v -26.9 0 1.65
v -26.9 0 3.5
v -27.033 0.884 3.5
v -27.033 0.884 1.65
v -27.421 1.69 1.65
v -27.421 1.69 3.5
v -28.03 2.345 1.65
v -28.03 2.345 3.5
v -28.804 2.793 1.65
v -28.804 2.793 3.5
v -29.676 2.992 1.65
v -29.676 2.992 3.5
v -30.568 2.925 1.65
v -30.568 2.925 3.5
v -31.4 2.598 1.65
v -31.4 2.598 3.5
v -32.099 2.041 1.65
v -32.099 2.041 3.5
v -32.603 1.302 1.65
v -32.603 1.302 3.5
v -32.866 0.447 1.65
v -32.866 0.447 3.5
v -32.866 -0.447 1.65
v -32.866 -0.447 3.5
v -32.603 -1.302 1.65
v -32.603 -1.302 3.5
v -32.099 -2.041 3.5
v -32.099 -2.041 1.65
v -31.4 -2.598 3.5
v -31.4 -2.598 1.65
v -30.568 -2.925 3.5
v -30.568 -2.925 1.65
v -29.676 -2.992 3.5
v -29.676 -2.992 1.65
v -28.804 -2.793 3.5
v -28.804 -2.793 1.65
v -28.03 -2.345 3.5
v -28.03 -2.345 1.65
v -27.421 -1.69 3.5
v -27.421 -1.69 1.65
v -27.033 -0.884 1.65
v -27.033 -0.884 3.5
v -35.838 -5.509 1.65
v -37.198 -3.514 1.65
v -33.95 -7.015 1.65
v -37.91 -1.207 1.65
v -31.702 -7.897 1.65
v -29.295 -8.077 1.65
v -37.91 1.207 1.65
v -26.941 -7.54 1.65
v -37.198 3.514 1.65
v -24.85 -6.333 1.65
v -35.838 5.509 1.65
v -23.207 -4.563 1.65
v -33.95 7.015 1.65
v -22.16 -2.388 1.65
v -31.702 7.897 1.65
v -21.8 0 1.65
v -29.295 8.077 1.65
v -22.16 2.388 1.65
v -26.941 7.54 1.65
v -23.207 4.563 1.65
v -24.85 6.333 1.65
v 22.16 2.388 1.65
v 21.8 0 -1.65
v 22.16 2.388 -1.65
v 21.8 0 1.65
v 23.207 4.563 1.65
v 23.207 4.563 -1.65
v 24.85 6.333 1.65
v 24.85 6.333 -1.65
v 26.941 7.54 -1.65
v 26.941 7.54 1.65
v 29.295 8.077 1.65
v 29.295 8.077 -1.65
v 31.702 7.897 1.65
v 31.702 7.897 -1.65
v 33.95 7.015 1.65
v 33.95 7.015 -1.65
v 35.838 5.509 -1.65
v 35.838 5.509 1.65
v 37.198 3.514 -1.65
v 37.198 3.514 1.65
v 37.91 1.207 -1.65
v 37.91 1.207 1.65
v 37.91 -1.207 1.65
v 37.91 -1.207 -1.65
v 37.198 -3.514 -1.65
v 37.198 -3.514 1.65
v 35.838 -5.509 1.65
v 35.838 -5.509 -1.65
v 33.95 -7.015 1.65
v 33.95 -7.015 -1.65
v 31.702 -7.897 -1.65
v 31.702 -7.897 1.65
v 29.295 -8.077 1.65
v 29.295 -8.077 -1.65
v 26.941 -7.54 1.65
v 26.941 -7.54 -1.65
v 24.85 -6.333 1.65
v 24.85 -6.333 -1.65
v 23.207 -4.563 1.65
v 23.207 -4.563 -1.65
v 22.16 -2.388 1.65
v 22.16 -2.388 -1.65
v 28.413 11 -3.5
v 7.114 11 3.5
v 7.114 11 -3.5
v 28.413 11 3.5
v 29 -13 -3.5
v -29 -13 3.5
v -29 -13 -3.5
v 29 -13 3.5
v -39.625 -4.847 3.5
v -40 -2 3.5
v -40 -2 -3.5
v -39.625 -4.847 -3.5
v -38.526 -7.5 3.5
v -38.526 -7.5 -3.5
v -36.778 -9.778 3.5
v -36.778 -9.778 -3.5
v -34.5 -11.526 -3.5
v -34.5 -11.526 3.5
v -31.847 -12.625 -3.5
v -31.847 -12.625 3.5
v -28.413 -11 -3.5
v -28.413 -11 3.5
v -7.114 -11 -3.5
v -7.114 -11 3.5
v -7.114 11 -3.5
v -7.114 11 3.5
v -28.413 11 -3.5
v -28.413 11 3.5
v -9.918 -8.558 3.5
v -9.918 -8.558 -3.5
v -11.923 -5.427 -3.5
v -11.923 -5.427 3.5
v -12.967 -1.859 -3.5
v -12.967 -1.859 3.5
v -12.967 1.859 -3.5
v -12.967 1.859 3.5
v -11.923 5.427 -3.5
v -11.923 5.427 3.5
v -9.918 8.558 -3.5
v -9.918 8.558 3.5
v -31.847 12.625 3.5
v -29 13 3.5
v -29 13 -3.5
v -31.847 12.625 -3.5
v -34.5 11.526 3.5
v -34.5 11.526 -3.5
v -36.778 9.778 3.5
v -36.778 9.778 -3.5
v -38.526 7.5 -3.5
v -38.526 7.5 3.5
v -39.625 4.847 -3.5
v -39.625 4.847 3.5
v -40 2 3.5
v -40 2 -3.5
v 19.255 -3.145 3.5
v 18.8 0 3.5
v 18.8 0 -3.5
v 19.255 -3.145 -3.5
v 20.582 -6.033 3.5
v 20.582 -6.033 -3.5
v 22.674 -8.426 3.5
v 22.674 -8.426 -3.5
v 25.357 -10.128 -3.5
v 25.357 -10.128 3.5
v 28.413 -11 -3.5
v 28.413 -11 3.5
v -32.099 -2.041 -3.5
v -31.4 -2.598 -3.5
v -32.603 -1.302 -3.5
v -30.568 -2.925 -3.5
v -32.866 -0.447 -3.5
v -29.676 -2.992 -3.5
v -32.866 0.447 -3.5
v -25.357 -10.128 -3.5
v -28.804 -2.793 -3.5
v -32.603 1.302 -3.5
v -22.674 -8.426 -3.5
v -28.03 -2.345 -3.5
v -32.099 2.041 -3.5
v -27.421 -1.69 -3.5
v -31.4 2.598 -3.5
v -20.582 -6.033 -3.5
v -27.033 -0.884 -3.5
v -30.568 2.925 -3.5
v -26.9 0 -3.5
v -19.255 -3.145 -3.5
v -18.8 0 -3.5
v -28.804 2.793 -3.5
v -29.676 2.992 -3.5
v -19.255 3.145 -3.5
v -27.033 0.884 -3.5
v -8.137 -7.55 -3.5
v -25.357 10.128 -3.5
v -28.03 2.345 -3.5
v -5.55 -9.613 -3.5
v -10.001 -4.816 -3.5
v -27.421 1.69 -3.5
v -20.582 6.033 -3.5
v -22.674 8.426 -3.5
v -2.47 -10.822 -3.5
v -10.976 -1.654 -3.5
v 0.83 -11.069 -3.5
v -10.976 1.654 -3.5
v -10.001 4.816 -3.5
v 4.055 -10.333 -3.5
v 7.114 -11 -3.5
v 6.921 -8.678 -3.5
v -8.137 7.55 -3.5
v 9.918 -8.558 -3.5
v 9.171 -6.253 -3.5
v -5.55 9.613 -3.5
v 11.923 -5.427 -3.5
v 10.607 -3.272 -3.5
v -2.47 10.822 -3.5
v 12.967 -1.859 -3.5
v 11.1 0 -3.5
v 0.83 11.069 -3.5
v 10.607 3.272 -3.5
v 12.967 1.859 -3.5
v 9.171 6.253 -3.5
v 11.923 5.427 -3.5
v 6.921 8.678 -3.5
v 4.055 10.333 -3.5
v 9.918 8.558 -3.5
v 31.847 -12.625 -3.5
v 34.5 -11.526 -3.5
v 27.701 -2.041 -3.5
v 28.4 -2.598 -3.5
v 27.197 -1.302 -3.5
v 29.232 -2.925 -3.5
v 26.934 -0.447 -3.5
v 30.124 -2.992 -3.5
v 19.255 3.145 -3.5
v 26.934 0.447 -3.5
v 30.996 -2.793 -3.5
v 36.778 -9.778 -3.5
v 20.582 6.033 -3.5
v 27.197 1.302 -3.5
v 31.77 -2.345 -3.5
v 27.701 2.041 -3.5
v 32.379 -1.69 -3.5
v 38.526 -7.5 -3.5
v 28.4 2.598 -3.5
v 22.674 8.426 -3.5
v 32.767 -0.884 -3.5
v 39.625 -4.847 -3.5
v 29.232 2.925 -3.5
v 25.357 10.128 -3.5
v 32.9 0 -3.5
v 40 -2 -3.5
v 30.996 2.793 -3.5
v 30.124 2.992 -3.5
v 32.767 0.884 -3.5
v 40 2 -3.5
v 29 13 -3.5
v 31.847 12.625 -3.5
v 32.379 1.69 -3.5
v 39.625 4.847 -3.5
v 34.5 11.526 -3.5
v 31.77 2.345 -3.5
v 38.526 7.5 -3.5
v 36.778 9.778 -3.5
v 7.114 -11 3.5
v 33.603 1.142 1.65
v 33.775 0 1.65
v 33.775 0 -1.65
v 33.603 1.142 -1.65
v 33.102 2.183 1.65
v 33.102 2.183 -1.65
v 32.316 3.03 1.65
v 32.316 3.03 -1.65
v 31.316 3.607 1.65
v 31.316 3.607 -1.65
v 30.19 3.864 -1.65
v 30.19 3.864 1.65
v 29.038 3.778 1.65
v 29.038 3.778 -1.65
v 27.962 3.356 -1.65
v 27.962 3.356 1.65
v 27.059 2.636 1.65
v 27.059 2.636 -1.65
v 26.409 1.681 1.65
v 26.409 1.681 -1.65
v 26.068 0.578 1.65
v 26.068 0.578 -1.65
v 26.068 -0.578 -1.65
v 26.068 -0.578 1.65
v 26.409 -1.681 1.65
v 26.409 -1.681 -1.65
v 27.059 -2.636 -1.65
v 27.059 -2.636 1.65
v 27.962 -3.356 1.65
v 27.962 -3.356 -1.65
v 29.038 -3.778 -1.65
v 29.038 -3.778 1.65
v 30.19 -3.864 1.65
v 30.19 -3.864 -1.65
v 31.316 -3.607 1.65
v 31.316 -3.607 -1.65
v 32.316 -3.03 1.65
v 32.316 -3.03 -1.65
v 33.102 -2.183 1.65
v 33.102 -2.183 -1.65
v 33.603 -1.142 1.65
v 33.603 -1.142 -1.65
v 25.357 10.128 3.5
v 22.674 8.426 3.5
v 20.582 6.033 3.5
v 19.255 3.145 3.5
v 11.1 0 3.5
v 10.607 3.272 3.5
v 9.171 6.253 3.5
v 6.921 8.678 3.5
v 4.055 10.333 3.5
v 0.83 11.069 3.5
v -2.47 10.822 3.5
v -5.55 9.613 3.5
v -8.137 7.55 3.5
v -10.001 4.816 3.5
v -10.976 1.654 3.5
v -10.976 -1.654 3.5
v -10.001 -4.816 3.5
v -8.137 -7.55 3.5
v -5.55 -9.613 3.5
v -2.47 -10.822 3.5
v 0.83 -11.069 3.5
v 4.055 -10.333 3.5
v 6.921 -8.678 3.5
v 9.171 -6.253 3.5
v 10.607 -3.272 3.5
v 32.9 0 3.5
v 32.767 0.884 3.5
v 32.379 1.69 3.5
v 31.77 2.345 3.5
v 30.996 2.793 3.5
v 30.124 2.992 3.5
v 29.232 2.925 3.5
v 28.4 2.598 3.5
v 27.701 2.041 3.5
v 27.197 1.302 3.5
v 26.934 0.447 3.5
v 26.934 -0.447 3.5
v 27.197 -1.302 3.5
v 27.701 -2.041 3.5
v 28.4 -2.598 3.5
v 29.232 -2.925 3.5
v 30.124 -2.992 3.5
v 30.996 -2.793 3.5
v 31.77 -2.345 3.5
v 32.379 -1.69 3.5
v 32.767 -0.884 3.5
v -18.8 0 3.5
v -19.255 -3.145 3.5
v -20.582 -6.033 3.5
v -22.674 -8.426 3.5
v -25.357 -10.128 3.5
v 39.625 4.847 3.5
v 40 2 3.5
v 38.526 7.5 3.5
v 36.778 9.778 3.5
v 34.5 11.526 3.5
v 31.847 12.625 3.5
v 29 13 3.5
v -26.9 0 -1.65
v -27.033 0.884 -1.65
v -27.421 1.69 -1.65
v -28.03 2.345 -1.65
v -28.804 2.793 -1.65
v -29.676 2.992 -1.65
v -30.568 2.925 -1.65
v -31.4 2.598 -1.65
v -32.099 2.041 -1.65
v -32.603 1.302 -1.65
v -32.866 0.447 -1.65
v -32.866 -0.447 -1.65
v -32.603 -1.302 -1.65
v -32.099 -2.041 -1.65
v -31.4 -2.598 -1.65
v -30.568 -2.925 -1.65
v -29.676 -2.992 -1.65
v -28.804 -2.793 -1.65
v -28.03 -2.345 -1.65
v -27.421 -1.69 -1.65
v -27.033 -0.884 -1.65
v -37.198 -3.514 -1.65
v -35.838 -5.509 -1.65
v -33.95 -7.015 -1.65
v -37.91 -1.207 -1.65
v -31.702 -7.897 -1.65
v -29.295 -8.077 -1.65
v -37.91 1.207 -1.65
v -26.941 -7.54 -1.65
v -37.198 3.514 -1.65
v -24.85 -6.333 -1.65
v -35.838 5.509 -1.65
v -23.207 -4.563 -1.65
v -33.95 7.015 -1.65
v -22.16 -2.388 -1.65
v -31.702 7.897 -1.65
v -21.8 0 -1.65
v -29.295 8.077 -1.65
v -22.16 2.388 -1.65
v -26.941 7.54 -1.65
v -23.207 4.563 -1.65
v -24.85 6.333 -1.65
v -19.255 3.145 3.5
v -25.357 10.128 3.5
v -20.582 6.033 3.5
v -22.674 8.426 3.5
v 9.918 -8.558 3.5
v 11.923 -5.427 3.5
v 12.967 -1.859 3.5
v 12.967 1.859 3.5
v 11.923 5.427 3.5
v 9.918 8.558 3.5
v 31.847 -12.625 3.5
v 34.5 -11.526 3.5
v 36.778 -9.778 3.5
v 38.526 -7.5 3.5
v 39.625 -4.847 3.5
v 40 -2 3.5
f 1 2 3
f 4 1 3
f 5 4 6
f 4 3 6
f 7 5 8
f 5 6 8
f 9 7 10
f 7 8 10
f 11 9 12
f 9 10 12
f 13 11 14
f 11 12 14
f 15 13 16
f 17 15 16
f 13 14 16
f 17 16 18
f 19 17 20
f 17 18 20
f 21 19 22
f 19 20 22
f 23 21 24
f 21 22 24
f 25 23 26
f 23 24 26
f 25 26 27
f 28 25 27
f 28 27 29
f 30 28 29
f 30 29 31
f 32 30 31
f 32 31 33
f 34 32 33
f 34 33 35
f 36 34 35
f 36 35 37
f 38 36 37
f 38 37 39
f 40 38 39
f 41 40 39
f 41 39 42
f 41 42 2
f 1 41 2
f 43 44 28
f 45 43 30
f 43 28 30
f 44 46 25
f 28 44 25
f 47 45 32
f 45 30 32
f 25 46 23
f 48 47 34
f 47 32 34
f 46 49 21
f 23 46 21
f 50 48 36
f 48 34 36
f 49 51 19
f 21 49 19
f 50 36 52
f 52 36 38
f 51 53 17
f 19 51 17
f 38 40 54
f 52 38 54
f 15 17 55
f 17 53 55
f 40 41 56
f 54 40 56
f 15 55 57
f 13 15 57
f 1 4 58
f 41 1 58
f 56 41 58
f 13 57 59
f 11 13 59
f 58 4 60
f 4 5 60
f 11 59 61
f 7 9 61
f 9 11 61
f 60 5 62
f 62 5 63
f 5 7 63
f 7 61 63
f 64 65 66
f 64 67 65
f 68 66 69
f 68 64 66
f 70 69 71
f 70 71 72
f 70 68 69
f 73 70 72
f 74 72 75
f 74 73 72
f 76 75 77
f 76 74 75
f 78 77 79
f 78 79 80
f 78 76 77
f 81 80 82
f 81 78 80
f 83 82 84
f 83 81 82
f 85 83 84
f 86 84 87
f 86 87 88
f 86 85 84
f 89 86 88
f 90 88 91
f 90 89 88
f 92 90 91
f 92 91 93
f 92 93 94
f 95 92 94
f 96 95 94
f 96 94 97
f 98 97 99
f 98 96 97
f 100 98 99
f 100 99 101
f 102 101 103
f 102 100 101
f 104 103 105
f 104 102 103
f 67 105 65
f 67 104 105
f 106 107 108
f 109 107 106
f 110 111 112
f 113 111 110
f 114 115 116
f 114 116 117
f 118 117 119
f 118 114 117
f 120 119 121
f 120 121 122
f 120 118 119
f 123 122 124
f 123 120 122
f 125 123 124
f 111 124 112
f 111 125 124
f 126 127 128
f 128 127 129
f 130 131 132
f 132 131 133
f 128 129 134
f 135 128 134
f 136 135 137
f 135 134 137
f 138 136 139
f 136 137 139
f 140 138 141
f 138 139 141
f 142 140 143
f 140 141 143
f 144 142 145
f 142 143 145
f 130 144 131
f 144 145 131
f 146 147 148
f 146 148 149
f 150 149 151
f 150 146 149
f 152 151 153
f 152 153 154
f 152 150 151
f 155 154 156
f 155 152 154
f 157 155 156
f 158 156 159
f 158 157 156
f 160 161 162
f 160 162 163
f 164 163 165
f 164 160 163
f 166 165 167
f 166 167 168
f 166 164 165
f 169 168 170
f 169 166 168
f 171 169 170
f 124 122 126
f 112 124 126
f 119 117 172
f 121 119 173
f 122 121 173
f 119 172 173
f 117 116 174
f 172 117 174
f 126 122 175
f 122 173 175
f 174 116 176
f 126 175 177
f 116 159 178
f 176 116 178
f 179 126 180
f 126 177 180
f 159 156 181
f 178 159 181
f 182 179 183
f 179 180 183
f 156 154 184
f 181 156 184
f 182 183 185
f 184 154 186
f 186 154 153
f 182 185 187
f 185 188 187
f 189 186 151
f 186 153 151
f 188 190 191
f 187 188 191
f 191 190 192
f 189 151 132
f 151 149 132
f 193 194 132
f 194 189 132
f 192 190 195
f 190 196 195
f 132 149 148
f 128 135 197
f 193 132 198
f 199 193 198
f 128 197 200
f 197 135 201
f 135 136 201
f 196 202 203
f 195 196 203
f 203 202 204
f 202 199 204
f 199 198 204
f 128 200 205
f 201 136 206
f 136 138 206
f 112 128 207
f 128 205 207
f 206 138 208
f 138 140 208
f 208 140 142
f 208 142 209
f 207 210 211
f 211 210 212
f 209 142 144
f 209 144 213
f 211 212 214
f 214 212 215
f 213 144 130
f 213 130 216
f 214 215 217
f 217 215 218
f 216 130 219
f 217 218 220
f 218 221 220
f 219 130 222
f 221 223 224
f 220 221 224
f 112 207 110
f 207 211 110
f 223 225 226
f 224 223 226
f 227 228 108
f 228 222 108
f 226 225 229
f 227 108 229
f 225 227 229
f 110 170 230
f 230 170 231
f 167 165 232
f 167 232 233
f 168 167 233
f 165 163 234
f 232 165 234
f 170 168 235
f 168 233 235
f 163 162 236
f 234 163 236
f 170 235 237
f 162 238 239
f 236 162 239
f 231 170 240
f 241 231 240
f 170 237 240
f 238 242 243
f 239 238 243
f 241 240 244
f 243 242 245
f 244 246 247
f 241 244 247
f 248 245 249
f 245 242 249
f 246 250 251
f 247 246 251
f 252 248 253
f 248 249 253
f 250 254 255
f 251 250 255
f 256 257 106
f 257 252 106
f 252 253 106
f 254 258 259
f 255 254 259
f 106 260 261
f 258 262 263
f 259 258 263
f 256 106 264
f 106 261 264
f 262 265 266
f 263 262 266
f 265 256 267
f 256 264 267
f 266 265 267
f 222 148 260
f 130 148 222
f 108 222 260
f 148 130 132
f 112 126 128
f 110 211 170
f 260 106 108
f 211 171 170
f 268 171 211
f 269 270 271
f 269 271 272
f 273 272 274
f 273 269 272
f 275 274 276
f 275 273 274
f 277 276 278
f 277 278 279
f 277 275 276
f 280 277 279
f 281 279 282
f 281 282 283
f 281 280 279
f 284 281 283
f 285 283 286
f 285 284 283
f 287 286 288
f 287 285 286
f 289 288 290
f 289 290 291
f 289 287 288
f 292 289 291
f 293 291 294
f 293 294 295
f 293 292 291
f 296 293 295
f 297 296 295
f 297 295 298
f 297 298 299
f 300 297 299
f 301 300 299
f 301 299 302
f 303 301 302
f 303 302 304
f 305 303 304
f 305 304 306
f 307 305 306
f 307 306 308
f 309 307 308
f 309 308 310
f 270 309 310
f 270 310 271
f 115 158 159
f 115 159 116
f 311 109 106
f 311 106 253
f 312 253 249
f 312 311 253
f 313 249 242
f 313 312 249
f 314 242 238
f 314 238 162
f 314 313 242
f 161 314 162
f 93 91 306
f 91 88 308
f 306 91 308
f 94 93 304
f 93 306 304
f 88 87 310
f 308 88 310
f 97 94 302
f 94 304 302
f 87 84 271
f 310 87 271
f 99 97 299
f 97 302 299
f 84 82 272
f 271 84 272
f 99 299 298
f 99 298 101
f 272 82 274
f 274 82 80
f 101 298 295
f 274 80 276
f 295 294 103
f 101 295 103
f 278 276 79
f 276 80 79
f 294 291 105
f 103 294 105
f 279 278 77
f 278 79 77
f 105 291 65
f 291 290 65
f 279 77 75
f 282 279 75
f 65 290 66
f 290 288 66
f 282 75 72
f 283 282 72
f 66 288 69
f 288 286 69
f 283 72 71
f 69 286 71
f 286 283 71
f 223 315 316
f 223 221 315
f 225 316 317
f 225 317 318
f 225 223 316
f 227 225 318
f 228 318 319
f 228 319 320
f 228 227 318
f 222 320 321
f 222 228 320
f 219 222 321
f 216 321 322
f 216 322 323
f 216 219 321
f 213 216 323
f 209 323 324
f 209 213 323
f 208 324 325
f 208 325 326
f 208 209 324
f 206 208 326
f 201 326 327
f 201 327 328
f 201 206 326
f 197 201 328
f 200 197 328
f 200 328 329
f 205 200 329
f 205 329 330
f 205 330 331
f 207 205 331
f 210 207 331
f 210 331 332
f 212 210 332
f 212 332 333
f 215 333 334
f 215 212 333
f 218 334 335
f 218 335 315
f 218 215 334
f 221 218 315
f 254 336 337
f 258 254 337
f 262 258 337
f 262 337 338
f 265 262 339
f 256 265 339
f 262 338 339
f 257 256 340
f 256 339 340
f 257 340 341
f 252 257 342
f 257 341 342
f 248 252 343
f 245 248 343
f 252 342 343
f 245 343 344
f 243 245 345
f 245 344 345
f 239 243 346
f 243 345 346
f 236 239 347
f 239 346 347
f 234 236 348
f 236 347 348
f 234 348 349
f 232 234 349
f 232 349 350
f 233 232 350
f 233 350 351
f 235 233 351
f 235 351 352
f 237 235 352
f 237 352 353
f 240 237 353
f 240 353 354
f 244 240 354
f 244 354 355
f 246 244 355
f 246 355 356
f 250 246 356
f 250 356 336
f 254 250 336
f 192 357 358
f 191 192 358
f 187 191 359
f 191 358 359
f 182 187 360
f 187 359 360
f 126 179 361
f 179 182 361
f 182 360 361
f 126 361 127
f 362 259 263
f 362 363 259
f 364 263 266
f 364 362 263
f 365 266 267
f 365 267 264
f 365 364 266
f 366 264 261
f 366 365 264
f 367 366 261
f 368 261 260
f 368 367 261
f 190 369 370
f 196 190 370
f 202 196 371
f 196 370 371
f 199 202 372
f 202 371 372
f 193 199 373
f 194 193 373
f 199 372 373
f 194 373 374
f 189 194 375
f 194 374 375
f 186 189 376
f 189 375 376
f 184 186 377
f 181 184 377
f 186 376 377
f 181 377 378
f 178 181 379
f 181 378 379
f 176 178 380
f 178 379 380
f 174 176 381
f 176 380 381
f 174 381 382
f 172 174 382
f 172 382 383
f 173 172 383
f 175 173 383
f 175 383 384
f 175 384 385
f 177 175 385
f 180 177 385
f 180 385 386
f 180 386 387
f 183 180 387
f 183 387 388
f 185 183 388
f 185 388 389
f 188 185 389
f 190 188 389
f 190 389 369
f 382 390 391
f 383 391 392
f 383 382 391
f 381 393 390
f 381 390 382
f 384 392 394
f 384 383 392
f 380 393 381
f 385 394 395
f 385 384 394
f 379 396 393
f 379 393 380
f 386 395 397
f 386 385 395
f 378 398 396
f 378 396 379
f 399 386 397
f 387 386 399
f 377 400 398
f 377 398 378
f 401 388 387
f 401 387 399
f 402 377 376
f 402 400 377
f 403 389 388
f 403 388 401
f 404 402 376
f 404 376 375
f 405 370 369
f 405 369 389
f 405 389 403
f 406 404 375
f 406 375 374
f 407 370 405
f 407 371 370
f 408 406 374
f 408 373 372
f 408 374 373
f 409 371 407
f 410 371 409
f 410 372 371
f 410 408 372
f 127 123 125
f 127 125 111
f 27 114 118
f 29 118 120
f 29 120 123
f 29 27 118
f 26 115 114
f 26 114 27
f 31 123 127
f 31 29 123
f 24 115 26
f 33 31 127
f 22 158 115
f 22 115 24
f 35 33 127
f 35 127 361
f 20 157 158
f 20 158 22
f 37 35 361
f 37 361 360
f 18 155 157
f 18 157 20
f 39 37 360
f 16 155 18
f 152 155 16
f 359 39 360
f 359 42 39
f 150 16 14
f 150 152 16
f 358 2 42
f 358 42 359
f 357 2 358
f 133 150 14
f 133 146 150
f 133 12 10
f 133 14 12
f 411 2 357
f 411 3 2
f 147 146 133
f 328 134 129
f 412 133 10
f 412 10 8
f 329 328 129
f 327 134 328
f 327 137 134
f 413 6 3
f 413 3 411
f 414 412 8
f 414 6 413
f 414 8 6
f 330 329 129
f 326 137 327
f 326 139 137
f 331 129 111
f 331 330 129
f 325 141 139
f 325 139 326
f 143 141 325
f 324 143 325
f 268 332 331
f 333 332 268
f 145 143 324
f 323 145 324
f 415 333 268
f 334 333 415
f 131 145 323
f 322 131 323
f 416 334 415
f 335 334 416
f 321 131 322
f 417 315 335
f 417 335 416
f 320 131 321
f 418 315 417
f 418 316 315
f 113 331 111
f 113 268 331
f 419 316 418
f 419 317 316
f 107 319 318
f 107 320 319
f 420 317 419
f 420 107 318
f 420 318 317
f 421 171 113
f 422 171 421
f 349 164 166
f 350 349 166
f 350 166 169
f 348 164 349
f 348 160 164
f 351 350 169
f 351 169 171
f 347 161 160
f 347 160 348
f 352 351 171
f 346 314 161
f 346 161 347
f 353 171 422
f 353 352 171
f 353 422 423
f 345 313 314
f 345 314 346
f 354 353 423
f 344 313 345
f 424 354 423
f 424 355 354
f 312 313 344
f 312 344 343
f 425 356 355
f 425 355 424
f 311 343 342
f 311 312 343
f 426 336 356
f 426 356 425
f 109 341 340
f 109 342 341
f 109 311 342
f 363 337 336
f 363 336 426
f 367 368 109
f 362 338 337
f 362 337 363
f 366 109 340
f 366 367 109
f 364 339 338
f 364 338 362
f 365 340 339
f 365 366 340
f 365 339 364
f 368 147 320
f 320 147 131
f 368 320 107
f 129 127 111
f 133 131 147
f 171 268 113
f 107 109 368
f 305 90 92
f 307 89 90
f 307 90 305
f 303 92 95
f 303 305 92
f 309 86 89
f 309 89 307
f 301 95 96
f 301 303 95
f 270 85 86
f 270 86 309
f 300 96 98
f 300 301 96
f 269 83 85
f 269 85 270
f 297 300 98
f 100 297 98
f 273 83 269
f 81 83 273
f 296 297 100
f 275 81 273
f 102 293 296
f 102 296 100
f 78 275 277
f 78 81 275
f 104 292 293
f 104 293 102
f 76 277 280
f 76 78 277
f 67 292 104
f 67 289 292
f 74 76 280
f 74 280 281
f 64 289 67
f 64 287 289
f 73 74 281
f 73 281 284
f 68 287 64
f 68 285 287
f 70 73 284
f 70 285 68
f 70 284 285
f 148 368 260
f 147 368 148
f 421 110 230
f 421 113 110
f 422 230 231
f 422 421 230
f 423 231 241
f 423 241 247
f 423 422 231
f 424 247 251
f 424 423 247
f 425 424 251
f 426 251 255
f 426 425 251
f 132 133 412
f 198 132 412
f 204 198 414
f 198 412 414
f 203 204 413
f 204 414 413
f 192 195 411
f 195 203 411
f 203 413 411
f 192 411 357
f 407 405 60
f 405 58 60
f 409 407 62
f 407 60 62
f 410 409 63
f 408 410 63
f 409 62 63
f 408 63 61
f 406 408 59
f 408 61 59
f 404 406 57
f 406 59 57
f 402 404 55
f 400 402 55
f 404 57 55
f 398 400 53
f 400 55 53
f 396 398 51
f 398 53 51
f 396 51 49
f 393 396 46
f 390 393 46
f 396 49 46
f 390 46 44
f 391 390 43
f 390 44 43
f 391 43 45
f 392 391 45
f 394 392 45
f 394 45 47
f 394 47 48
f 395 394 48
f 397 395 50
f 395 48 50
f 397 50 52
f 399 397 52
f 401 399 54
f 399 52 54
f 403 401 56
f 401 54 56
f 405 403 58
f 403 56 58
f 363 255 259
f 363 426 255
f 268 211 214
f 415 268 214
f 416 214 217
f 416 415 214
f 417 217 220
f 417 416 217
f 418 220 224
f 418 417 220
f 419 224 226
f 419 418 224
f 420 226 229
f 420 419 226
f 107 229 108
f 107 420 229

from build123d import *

# Parameters (mm, degrees)
F0_R      = 11.1
F1_DEPTH  = 3.5
F2_R      = 8.1
F4_DEPTH  = 1.65
F6_DEPTH  = 7.001
F7_R      = 3
F8_DEPTH  = 7.001
F9_R      = 3.875
F9_R_2    = 3
F10_DEPTH = 7


# Not quite as in the source:
# - a pattern or mirror of a feature is missing from the dataset's text; its kind, count and spacing are read off the source's solid


with BuildPart() as f1:
    # F0 (on Top) → F1 (new body, symmetric)
    with BuildSketch(Plane.XY):
        with BuildLine():
            ThreePointArc((40, 2), (36.7781745931, 9.7781745931), (29, 13))
            Line((29, 13), (-29, 13))
            ThreePointArc((-29, 13), (-36.7781745931, 9.7781745931), (-40, 2))
            Line((-40, 2), (-40, -2))
            ThreePointArc((-40, -2), (-36.7781745931, -9.7781745931), (-29, -13))
            Line((-29, -13), (29, -13))
            ThreePointArc((29, -13), (36.7781745931, -9.7781745931), (40, -2))
            Line((40, -2), (40, 2))
        make_face()
        Circle(F0_R, mode=Mode.SUBTRACT)
    extrude(amount=F1_DEPTH, both=True)

    # F2 (on Top) → F4 (cut, symmetric)
    with BuildSketch(Plane.XY):
        with Locations((-29.9, 0)):
            Circle(F2_R)
    f4 = extrude(amount=F4_DEPTH, both=True, mode=Mode.SUBTRACT)

    # F4_copies: F4 across plane
    add(f4.mirror(Plane(origin=(0, 0, 0), x_dir=(0, 0, 1), z_dir=(1, 0, 0))), mode=Mode.SUBTRACT)

    # F5 (on face) → F6 (cut, through all)
    with BuildSketch(Plane.XY.offset(3.5)):
        with BuildLine():
            ThreePointArc((-7.1140705647, -11), (-13.1, 0), (-7.1140705647, 11))
            Line((-7.1140705647, 11), (-28.4133931253, 11))
            ThreePointArc((-28.4133931253, 11), (-21.542029663, 7.3044049618), (-18.8, 0))
            ThreePointArc((-18.8, 0), (-21.542029663, -7.3044049618), (-28.4133931253, -11))
            Line((-28.4133931253, -11), (-7.1140705647, -11))
        make_face()
    f6 = extrude(amount=-F6_DEPTH, mode=Mode.SUBTRACT)

    # F6_copies: F6 across plane
    add(f6.mirror(Plane(origin=(0, 0, 0), x_dir=(0, 0, 1), z_dir=(1, 0, 0))), mode=Mode.SUBTRACT)

    # F7 (on face) → F8 (cut, through all)
    with BuildSketch(Plane.XY.offset(3.5)):
        with Locations((29.9, 0)):
            Circle(F7_R)
        with Locations((-29.9, 0)):
            Circle(F7_R)
    extrude(amount=-F8_DEPTH, mode=Mode.SUBTRACT)

    # F9 (on face) → F10 (join, through all)
    with BuildSketch(Plane.XY.offset(3.5)):
        with Locations((29.9, 0)):
            Circle(F9_R)
        with Locations((29.9, 0)):
            Circle(F9_R_2, mode=Mode.SUBTRACT)
    extrude(amount=-F10_DEPTH)


solid = f1.part
